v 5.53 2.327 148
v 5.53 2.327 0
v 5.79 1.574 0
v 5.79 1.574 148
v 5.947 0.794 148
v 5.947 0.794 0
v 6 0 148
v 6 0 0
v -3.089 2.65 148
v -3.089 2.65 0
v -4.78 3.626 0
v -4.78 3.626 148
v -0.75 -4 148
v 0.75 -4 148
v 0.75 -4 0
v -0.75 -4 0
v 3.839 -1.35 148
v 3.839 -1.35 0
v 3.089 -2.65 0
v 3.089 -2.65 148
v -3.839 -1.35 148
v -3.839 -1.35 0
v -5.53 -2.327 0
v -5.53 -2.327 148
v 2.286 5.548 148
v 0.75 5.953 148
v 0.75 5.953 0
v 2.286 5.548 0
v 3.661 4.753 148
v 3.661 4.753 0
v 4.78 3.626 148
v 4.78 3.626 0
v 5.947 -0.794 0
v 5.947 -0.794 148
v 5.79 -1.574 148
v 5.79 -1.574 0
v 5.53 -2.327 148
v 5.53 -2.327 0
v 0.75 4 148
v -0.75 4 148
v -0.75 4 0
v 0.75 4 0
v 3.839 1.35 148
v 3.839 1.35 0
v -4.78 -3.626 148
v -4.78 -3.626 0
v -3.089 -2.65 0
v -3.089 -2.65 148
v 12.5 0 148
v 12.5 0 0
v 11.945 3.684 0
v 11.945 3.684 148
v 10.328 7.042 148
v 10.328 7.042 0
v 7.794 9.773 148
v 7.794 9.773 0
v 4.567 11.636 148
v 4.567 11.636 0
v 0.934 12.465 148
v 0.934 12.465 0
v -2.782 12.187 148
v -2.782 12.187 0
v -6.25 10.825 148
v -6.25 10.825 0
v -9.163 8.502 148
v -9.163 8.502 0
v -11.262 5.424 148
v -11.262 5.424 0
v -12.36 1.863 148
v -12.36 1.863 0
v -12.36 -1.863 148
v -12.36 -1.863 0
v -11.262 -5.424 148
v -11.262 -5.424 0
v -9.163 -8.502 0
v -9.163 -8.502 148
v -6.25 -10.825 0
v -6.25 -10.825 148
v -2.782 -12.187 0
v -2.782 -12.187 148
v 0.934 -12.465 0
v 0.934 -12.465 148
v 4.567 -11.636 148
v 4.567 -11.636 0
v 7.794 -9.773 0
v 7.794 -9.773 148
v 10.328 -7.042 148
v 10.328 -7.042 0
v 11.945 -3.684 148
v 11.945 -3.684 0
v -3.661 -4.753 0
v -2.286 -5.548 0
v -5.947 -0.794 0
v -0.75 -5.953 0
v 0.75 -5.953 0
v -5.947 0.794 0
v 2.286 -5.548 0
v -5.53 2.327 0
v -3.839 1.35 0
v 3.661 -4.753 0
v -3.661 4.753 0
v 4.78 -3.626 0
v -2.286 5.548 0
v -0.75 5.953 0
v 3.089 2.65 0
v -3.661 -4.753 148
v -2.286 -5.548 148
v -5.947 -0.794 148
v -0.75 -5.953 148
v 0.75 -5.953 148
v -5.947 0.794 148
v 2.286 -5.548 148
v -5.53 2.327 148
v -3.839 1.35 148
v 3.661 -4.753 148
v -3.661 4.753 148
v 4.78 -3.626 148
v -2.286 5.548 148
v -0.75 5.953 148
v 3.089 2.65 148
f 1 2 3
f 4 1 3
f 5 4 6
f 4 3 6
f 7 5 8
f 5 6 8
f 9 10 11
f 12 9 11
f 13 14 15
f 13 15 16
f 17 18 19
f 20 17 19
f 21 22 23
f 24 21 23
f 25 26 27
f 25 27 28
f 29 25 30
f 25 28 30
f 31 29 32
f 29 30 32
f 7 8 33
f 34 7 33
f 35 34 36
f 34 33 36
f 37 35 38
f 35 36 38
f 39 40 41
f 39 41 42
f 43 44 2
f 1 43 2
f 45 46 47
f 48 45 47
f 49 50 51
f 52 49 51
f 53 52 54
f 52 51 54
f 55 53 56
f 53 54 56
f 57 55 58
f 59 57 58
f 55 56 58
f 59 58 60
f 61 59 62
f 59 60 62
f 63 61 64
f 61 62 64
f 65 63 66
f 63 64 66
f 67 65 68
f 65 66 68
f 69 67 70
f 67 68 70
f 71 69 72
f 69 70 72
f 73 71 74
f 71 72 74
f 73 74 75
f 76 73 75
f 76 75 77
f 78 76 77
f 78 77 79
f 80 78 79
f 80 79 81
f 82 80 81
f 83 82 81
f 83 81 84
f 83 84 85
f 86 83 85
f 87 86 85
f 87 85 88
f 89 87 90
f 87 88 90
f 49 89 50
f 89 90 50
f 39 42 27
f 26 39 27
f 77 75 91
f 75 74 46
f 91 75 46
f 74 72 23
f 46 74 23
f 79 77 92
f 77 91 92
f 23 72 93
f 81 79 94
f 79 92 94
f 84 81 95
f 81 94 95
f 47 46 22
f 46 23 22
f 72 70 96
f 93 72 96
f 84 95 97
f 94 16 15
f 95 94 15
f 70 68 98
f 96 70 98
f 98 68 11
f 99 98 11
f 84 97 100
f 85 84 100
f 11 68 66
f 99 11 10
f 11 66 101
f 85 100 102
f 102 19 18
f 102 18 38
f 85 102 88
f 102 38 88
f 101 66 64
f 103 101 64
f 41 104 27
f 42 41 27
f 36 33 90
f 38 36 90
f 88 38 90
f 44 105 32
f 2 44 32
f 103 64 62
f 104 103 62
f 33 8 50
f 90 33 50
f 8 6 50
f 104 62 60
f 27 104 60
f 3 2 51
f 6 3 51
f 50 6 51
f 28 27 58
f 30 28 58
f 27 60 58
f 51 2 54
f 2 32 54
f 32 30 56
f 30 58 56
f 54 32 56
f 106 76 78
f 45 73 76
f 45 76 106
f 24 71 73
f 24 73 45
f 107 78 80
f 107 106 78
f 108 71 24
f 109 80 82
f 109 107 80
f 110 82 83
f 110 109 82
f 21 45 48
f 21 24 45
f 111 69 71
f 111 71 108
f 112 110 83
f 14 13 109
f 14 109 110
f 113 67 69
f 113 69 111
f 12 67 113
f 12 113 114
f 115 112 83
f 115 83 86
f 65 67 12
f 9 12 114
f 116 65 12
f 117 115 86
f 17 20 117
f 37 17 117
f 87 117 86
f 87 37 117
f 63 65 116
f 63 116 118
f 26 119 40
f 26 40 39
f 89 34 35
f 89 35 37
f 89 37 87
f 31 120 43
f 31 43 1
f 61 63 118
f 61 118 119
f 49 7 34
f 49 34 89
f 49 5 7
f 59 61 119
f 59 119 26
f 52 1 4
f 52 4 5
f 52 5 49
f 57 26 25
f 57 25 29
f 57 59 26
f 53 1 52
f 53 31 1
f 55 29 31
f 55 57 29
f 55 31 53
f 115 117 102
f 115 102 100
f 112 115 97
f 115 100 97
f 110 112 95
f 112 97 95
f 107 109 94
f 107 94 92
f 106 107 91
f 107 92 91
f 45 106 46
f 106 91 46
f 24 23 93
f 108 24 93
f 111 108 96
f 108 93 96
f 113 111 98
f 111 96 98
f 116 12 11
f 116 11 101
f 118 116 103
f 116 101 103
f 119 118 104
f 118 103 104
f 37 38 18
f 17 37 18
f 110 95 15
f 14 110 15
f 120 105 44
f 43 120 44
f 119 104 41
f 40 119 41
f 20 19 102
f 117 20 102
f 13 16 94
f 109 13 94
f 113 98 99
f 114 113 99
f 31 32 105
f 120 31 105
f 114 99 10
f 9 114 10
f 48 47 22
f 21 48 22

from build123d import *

# Parameters (mm, degrees)
F0_R     = 12.5
F1_DEPTH = 148


with BuildPart() as f1:
    # F0 (on Top) → F1 (new body)
    with BuildSketch(Plane.XY):
        Circle(F0_R)
        with BuildLine():
            ThreePointArc((5.5303976568, 2.3269511721), (5.8814278003, 1.1869317712), (6, 0))
            ThreePointArc((6, 0), (5.8814278003, -1.1869317712), (5.5303976568, -2.3269511721))
            Line((5.5303976568, -2.3269511721), (5.5711524227, -2.3504809472))
            Line((5.5711524227, -2.3504809472), (5.1961523876, -3.0000000609))
            Line((5.1961523876, -3.0000000609), (4.8211524227, -3.6495190528))
            Line((4.8211524227, -3.6495190528), (4.7803976568, -3.6259892778))
            ThreePointArc((4.7803976568, -3.6259892778), (3, -5.1961524227), (0.75, -5.9529404499))
            Line((0.75, -5.9529404499), (0.75, -6))
            Line((0.75, -6), (0, -6))
            Line((0, -6), (-0.75, -6))
            Line((-0.75, -6), (-0.75, -5.9529404499))
            ThreePointArc((-0.75, -5.9529404499), (-3, -5.1961524227), (-4.7803976568, -3.6259892778))
            Line((-4.7803976568, -3.6259892778), (-4.8211524227, -3.6495190528))
            Line((-4.8211524227, -3.6495190528), (-5.1961524003, -3.0000000387))
            Line((-5.1961524003, -3.0000000387), (-5.5711524227, -2.3504809472))
            Line((-5.5711524227, -2.3504809472), (-5.5303976568, -2.3269511721))
            ThreePointArc((-5.5303976568, -2.3269511721), (-6, 0), (-5.5303976568, 2.3269511721))
            Line((-5.5303976568, 2.3269511721), (-5.5711524227, 2.3504809472))
            Line((-5.5711524227, 2.3504809472), (-5.1961524003, 3.0000000387))
            Line((-5.1961524003, 3.0000000387), (-4.8211524227, 3.6495190528))
            Line((-4.8211524227, 3.6495190528), (-4.7803976568, 3.6259892778))
            ThreePointArc((-4.7803976568, 3.6259892778), (-3, 5.1961524227), (-0.75, 5.9529404499))
            Line((-0.75, 5.9529404499), (-0.75, 6))
            Line((-0.75, 6), (0, 6))
            Line((0, 6), (0.75, 6))
            Line((0.75, 6), (0.75, 5.9529404499))
            ThreePointArc((0.75, 5.9529404499), (3, 5.1961524227), (4.7803976568, 3.6259892778))
            Line((4.7803976568, 3.6259892778), (4.8211524227, 3.6495190528))
            Line((4.8211524227, 3.6495190528), (5.1961524003, 3.0000000387))
            Line((5.1961524003, 3.0000000387), (5.5711524227, 2.3504809472))
            Line((5.5711524227, 2.3504809472), (5.5303976568, 2.3269511721))
        make_face(mode=Mode.SUBTRACT)
        with BuildLine():
            Line((-3.0891016151, 2.6495190528), (-4.7803976568, 3.6259892778))
            ThreePointArc((-4.7803976568, 3.6259892778), (-4.9980849725, 3.3195099951), (-5.1961524003, 3.0000000387))
            ThreePointArc((-5.1961524003, 3.0000000387), (-5.3738224502, 2.668713599), (-5.5303976568, 2.3269511721))
            Line((-5.5303976568, 2.3269511721), (-3.8391016151, 1.3504809472))
            Line((-3.8391016151, 1.3504809472), (-3.0891016151, 2.6495190528))
        make_face()
        with BuildLine():
            Line((0.75, 4), (0.75, 5.9529404499))
            ThreePointArc((0.75, 5.9529404499), (0.3757374753, 5.9882235554), (0, 6))
            ThreePointArc((0, 6), (-0.3757374753, 5.9882235554), (-0.75, 5.9529404499))
            Line((-0.75, 5.9529404499), (-0.75, 4))
            Line((-0.75, 4), (0.75, 4))
        make_face()
        with BuildLine():
            Line((3.8391016151, 1.3504809472), (5.5303976568, 2.3269511721))
            ThreePointArc((5.5303976568, 2.3269511721), (5.3738224502, 2.668713599), (5.1961524003, 3.0000000387))
            ThreePointArc((5.1961524003, 3.0000000387), (4.9980849725, 3.3195099951), (4.7803976568, 3.6259892778))
            Line((4.7803976568, 3.6259892778), (3.0891016151, 2.6495190528))
            Line((3.0891016151, 2.6495190528), (3.8391016151, 1.3504809472))
        make_face()
        with BuildLine():
            ThreePointArc((5.1961523876, -3.0000000609), (5.3738224445, -2.6687136105), (5.5303976568, -2.3269511721))
            Line((5.5303976568, -2.3269511721), (3.8391016151, -1.3504809472))
            Line((3.8391016151, -1.3504809472), (3.0891016151, -2.6495190528))
            Line((3.0891016151, -2.6495190528), (4.7803976568, -3.6259892778))
            ThreePointArc((4.7803976568, -3.6259892778), (4.9980849655, -3.3195100057), (5.1961523876, -3.0000000609))
        make_face()
        with BuildLine():
            ThreePointArc((0, -6), (0.3757374753, -5.9882235554), (0.75, -5.9529404499))
            Line((0.75, -5.9529404499), (0.75, -4))
            Line((0.75, -4), (-0.75, -4))
            Line((-0.75, -4), (-0.75, -5.9529404499))
            ThreePointArc((-0.75, -5.9529404499), (-0.3757374753, -5.9882235554), (0, -6))
        make_face()
        with BuildLine():
            ThreePointArc((-5.1961524003, -3.0000000387), (-4.9980849725, -3.3195099951), (-4.7803976568, -3.6259892778))
            Line((-4.7803976568, -3.6259892778), (-3.0891016151, -2.6495190528))
            Line((-3.0891016151, -2.6495190528), (-3.8391016151, -1.3504809472))
            Line((-3.8391016151, -1.3504809472), (-5.5303976568, -2.3269511721))
            ThreePointArc((-5.5303976568, -2.3269511721), (-5.3738224502, -2.668713599), (-5.1961524003, -3.0000000387))
        make_face()
        with BuildLine():
            ThreePointArc((0, 6), (0.3757374753, 5.9882235554), (0.75, 5.9529404499))
            Line((0.75, 5.9529404499), (0.75, 6))
            Line((0.75, 6), (0, 6))
        make_face()
        with BuildLine():
            ThreePointArc((-0.75, 5.9529404499), (-0.3757374753, 5.9882235554), (0, 6))
            Line((0, 6), (-0.75, 6))
            Line((-0.75, 6), (-0.75, 5.9529404499))
        make_face()
        with BuildLine():
            ThreePointArc((-5.1961524003, 3.0000000387), (-4.9980849725, 3.3195099951), (-4.7803976568, 3.6259892778))
            Line((-4.7803976568, 3.6259892778), (-4.8211524227, 3.6495190528))
            Line((-4.8211524227, 3.6495190528), (-5.1961524003, 3.0000000387))
        make_face()
        with BuildLine():
            ThreePointArc((4.7803976568, 3.6259892778), (4.9980849725, 3.3195099951), (5.1961524003, 3.0000000387))
            Line((5.1961524003, 3.0000000387), (4.8211524227, 3.6495190528))
            Line((4.8211524227, 3.6495190528), (4.7803976568, 3.6259892778))
        make_face()
        with BuildLine():
            Line((0.75, -6), (0.75, -5.9529404499))
            ThreePointArc((0.75, -5.9529404499), (0.3757374753, -5.9882235554), (0, -6))
            Line((0, -6), (0.75, -6))
        make_face()
        with BuildLine():
            Line((4.8211524227, -3.6495190528), (5.1961523876, -3.0000000609))
            ThreePointArc((5.1961523876, -3.0000000609), (4.9980849655, -3.3195100057), (4.7803976568, -3.6259892778))
            Line((4.7803976568, -3.6259892778), (4.8211524227, -3.6495190528))
        make_face()
        with BuildLine():
            ThreePointArc((5.1961524003, 3.0000000387), (5.3738224502, 2.668713599), (5.5303976568, 2.3269511721))
            Line((5.5303976568, 2.3269511721), (5.5711524227, 2.3504809472))
            Line((5.5711524227, 2.3504809472), (5.1961524003, 3.0000000387))
        make_face()
        with BuildLine():
            ThreePointArc((-5.5303976568, 2.3269511721), (-5.3738224502, 2.668713599), (-5.1961524003, 3.0000000387))
            Line((-5.1961524003, 3.0000000387), (-5.5711524227, 2.3504809472))
            Line((-5.5711524227, 2.3504809472), (-5.5303976568, 2.3269511721))
        make_face()
        with BuildLine():
            Line((-5.5711524227, -2.3504809472), (-5.1961524003, -3.0000000387))
            ThreePointArc((-5.1961524003, -3.0000000387), (-5.3738224502, -2.668713599), (-5.5303976568, -2.3269511721))
            Line((-5.5303976568, -2.3269511721), (-5.5711524227, -2.3504809472))
        make_face()
        with BuildLine():
            Line((-4.8211524227, -3.6495190528), (-4.7803976568, -3.6259892778))
            ThreePointArc((-4.7803976568, -3.6259892778), (-4.9980849725, -3.3195099951), (-5.1961524003, -3.0000000387))
            Line((-5.1961524003, -3.0000000387), (-4.8211524227, -3.6495190528))
        make_face()
        with BuildLine():
            Line((-0.75, -6), (0, -6))
            ThreePointArc((0, -6), (-0.3757374753, -5.9882235554), (-0.75, -5.9529404499))
            Line((-0.75, -5.9529404499), (-0.75, -6))
        make_face()
        with BuildLine():
            Line((5.5711524227, -2.3504809472), (5.5303976568, -2.3269511721))
            ThreePointArc((5.5303976568, -2.3269511721), (5.3738224445, -2.6687136105), (5.1961523876, -3.0000000609))
            Line((5.1961523876, -3.0000000609), (5.5711524227, -2.3504809472))
        make_face()
    extrude(amount=F1_DEPTH)


solid = f1.part
